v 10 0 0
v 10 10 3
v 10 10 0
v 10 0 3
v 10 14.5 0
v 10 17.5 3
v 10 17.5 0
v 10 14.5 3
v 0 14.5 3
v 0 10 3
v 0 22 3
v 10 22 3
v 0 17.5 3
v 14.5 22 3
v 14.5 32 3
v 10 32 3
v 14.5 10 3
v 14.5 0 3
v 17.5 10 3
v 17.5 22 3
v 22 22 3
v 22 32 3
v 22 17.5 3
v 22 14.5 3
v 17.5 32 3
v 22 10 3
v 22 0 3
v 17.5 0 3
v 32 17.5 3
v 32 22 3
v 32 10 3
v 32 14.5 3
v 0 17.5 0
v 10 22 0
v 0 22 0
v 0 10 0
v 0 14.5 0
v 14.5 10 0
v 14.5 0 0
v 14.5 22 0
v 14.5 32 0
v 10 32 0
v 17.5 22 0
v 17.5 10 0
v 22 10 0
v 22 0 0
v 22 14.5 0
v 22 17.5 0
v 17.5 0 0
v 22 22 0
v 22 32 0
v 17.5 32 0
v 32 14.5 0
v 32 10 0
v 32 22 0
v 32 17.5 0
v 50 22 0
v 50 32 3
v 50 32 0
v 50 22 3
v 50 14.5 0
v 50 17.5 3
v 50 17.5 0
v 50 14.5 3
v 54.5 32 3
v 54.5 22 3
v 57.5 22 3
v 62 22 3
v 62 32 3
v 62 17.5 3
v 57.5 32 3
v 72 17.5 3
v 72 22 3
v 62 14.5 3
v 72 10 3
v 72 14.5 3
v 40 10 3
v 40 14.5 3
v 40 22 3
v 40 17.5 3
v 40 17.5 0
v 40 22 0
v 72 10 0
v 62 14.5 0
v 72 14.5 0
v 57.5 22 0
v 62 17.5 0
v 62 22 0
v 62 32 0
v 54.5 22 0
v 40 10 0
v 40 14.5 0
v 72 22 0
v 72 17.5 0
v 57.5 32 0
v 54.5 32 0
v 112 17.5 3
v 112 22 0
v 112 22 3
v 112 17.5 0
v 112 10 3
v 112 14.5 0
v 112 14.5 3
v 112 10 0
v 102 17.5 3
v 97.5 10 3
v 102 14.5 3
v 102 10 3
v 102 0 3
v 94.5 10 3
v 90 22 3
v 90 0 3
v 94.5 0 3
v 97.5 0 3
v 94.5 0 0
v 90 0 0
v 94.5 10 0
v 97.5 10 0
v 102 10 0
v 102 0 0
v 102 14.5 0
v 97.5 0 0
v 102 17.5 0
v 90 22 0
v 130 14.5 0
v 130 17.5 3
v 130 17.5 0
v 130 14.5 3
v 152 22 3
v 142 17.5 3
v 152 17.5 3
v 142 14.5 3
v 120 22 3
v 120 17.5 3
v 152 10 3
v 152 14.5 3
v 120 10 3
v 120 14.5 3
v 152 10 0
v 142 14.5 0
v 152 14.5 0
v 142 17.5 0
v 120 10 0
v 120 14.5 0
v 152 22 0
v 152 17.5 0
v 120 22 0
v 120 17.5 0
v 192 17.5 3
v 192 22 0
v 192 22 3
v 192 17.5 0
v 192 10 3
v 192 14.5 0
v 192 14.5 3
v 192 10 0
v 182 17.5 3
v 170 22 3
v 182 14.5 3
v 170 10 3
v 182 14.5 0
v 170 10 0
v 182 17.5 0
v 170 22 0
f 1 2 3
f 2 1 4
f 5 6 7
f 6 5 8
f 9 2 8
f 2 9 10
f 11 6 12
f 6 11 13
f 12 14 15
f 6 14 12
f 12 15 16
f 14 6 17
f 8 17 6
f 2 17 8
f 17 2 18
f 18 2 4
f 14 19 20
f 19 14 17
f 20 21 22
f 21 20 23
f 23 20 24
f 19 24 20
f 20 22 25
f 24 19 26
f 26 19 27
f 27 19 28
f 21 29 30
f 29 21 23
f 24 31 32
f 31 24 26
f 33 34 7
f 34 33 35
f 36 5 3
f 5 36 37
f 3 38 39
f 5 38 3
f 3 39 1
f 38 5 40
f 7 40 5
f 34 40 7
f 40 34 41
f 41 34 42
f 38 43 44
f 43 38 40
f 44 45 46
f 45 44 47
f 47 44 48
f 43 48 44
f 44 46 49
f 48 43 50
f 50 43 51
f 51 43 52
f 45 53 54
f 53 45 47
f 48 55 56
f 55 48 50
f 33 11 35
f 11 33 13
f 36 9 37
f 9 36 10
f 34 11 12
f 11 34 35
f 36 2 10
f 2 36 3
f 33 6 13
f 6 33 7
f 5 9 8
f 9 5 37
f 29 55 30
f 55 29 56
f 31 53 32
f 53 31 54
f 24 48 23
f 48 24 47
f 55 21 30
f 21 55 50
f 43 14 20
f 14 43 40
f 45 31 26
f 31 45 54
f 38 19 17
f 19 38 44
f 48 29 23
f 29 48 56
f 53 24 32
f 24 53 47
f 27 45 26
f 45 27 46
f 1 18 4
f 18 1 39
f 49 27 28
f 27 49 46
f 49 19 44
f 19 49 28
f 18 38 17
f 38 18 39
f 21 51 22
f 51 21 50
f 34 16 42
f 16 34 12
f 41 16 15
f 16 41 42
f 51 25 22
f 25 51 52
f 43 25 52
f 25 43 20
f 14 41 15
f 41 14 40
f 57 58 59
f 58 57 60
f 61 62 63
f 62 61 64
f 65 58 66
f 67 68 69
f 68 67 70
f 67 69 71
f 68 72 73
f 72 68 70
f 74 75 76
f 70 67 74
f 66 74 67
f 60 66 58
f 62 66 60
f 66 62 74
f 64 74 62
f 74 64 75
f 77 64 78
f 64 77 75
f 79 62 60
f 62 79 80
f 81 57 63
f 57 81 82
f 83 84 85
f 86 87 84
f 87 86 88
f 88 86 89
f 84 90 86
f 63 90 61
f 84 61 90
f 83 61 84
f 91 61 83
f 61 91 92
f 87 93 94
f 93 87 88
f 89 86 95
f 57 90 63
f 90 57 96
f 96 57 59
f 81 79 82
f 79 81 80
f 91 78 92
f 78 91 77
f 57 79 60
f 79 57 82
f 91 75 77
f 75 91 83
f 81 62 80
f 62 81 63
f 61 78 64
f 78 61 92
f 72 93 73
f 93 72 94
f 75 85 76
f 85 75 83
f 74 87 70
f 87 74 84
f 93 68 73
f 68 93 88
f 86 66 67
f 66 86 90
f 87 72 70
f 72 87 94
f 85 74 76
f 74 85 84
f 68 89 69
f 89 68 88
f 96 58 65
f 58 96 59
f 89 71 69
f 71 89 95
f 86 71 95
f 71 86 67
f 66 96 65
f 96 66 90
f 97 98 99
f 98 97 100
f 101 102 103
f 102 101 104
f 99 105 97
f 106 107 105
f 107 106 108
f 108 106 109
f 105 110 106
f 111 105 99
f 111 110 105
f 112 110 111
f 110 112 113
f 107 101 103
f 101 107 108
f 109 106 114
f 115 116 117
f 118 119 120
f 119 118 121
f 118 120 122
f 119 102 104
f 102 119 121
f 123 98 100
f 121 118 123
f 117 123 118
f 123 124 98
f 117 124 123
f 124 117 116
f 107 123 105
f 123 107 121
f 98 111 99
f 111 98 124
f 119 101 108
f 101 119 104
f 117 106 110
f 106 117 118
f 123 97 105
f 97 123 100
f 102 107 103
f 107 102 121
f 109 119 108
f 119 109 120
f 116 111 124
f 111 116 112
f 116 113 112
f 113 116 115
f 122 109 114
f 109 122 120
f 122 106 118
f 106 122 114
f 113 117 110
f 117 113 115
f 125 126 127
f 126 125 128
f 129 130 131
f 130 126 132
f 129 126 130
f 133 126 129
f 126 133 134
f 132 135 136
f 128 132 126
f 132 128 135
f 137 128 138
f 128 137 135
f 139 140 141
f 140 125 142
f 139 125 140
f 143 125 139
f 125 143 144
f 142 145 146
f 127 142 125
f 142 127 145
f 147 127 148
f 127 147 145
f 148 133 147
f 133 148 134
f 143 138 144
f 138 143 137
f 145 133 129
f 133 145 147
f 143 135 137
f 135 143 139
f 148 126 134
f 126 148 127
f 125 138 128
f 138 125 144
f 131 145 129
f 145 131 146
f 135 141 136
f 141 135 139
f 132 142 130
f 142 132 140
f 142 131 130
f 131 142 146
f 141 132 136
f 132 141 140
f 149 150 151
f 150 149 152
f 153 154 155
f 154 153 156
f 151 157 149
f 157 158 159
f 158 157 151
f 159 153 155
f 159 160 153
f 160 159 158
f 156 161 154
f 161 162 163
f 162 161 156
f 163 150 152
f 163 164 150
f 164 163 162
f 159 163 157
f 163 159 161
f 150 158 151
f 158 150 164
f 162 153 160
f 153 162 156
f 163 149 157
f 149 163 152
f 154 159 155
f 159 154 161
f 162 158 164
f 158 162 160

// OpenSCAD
// ============================================================
// Hamster Habitat — Dikey Kup Kenar Baglantilar
// H ekseni Z yonunde (30mm dikey), kollar X ve Y'ye uzaniyor
// Panel kenari (3mm kirish) slottan geciyor
// Yerlesim: translate([X, Y, Z_mid]) connector()
//   On-sag  kenari: translate([ 92.5, -14.5, Z]) L_on_sag()
//   On-sol  kenari: translate([-14.5, -14.5, Z]) L_on_sol()
//   Arka-sag kenari: translate([ 92.5, 124.5, Z]) L_arka_sag()
//   Arka-sol kenari: translate([-14.5, 124.5, Z]) L_arka_sol()
// ============================================================
$fn = 32;

H = 3.0;   // yukseklik (Z) — ince klips, exact fit notch ile
K = 3.0;   // slot genisligi (panel kalinligi)

module saft_v() {
  translate([10, 10, 0]) cube([12, 12, H]);
}

// +X yonune uzaniyor — slot Y=14.5..17.5 (3mm in Y)
module kol_xsag_v() {
  difference() {
    translate([22, 10, 0]) cube([10, 12, H]);
    translate([21.9, 14.5, -0.1]) cube([10.2, K, H+0.2]);
  }
}

// -X yonune uzaniyor — slot Y=14.5..17.5
module kol_xsol_v() {
  difference() {
    translate([0, 10, 0]) cube([10, 12, H]);
    translate([-0.1, 14.5, -0.1]) cube([10.2, K, H+0.2]);
  }
}

// +Y yonune uzaniyor — slot X=14.5..17.5 (3mm in X)
module kol_yust_v() {
  difference() {
    translate([10, 22, 0]) cube([12, 10, H]);
    translate([14.5, 21.9, -0.1]) cube([K, 10.2, H+0.2]);
  }
}

// -Y yonune uzaniyor — slot X=14.5..17.5
module kol_yalt_v() {
  difference() {
    translate([10, 0, 0]) cube([12, 10, H]);
    translate([14.5, -0.1, -0.1]) cube([K, 10.2, H+0.2]);
  }
}

// --- Connector ailesi (dikey kup icin) ---

module kenar_plus_v() {  // 4 kol — T kavsaklar, orta panel birlesimi
  color("tomato", 0.9)
  union() { saft_v(); kol_xsol_v(); kol_xsag_v(); kol_yalt_v(); kol_yust_v(); }
}

module kenar_T_v() {     // 3 kol
  color("orange", 0.9)
  union() { saft_v(); kol_xsol_v(); kol_xsag_v(); kol_yust_v(); }
}

// 4 L varyanti — dikey kup 4 kenari icin
module L_on_sag() {      // on(Y=0..3) + sag(X=107..110) kenari
  color("dodgerblue", 0.9)
  union() { saft_v(); kol_xsag_v(); kol_yalt_v(); }
}

module L_on_sol() {      // on(Y=0..3) + sol(X=0..3) kenari
  color("dodgerblue", 0.9)
  union() { saft_v(); kol_xsol_v(); kol_yalt_v(); }
}

module L_arka_sag() {    // arka(Y=107..110) + sag(X=107..110) kenari
  color("dodgerblue", 0.9)
  union() { saft_v(); kol_xsag_v(); kol_yust_v(); }
}

module L_arka_sol() {    // arka(Y=107..110) + sol(X=0..3) kenari
  color("dodgerblue", 0.9)
  union() { saft_v(); kol_xsol_v(); kol_yust_v(); }
}

module kenar_duz_v() {   // 2 kol duz (panel uzantisi icin)
  color("gold", 0.9)
  union() { saft_v(); kol_xsol_v(); kol_xsag_v(); }
}

module kenar_son_v() {   // 1 kol (kenar sonu / kap)
  color("yellowgreen", 0.9)
  union() { saft_v(); kol_xsag_v(); }
}

// Preview: hepsini yan yana goster
translate([  0, 0, 0]) kenar_plus_v();
translate([ 40, 0, 0]) kenar_T_v();
translate([ 80, 0, 0]) L_on_sag();
translate([120, 0, 0]) kenar_duz_v();
translate([160, 0, 0]) kenar_son_v();
